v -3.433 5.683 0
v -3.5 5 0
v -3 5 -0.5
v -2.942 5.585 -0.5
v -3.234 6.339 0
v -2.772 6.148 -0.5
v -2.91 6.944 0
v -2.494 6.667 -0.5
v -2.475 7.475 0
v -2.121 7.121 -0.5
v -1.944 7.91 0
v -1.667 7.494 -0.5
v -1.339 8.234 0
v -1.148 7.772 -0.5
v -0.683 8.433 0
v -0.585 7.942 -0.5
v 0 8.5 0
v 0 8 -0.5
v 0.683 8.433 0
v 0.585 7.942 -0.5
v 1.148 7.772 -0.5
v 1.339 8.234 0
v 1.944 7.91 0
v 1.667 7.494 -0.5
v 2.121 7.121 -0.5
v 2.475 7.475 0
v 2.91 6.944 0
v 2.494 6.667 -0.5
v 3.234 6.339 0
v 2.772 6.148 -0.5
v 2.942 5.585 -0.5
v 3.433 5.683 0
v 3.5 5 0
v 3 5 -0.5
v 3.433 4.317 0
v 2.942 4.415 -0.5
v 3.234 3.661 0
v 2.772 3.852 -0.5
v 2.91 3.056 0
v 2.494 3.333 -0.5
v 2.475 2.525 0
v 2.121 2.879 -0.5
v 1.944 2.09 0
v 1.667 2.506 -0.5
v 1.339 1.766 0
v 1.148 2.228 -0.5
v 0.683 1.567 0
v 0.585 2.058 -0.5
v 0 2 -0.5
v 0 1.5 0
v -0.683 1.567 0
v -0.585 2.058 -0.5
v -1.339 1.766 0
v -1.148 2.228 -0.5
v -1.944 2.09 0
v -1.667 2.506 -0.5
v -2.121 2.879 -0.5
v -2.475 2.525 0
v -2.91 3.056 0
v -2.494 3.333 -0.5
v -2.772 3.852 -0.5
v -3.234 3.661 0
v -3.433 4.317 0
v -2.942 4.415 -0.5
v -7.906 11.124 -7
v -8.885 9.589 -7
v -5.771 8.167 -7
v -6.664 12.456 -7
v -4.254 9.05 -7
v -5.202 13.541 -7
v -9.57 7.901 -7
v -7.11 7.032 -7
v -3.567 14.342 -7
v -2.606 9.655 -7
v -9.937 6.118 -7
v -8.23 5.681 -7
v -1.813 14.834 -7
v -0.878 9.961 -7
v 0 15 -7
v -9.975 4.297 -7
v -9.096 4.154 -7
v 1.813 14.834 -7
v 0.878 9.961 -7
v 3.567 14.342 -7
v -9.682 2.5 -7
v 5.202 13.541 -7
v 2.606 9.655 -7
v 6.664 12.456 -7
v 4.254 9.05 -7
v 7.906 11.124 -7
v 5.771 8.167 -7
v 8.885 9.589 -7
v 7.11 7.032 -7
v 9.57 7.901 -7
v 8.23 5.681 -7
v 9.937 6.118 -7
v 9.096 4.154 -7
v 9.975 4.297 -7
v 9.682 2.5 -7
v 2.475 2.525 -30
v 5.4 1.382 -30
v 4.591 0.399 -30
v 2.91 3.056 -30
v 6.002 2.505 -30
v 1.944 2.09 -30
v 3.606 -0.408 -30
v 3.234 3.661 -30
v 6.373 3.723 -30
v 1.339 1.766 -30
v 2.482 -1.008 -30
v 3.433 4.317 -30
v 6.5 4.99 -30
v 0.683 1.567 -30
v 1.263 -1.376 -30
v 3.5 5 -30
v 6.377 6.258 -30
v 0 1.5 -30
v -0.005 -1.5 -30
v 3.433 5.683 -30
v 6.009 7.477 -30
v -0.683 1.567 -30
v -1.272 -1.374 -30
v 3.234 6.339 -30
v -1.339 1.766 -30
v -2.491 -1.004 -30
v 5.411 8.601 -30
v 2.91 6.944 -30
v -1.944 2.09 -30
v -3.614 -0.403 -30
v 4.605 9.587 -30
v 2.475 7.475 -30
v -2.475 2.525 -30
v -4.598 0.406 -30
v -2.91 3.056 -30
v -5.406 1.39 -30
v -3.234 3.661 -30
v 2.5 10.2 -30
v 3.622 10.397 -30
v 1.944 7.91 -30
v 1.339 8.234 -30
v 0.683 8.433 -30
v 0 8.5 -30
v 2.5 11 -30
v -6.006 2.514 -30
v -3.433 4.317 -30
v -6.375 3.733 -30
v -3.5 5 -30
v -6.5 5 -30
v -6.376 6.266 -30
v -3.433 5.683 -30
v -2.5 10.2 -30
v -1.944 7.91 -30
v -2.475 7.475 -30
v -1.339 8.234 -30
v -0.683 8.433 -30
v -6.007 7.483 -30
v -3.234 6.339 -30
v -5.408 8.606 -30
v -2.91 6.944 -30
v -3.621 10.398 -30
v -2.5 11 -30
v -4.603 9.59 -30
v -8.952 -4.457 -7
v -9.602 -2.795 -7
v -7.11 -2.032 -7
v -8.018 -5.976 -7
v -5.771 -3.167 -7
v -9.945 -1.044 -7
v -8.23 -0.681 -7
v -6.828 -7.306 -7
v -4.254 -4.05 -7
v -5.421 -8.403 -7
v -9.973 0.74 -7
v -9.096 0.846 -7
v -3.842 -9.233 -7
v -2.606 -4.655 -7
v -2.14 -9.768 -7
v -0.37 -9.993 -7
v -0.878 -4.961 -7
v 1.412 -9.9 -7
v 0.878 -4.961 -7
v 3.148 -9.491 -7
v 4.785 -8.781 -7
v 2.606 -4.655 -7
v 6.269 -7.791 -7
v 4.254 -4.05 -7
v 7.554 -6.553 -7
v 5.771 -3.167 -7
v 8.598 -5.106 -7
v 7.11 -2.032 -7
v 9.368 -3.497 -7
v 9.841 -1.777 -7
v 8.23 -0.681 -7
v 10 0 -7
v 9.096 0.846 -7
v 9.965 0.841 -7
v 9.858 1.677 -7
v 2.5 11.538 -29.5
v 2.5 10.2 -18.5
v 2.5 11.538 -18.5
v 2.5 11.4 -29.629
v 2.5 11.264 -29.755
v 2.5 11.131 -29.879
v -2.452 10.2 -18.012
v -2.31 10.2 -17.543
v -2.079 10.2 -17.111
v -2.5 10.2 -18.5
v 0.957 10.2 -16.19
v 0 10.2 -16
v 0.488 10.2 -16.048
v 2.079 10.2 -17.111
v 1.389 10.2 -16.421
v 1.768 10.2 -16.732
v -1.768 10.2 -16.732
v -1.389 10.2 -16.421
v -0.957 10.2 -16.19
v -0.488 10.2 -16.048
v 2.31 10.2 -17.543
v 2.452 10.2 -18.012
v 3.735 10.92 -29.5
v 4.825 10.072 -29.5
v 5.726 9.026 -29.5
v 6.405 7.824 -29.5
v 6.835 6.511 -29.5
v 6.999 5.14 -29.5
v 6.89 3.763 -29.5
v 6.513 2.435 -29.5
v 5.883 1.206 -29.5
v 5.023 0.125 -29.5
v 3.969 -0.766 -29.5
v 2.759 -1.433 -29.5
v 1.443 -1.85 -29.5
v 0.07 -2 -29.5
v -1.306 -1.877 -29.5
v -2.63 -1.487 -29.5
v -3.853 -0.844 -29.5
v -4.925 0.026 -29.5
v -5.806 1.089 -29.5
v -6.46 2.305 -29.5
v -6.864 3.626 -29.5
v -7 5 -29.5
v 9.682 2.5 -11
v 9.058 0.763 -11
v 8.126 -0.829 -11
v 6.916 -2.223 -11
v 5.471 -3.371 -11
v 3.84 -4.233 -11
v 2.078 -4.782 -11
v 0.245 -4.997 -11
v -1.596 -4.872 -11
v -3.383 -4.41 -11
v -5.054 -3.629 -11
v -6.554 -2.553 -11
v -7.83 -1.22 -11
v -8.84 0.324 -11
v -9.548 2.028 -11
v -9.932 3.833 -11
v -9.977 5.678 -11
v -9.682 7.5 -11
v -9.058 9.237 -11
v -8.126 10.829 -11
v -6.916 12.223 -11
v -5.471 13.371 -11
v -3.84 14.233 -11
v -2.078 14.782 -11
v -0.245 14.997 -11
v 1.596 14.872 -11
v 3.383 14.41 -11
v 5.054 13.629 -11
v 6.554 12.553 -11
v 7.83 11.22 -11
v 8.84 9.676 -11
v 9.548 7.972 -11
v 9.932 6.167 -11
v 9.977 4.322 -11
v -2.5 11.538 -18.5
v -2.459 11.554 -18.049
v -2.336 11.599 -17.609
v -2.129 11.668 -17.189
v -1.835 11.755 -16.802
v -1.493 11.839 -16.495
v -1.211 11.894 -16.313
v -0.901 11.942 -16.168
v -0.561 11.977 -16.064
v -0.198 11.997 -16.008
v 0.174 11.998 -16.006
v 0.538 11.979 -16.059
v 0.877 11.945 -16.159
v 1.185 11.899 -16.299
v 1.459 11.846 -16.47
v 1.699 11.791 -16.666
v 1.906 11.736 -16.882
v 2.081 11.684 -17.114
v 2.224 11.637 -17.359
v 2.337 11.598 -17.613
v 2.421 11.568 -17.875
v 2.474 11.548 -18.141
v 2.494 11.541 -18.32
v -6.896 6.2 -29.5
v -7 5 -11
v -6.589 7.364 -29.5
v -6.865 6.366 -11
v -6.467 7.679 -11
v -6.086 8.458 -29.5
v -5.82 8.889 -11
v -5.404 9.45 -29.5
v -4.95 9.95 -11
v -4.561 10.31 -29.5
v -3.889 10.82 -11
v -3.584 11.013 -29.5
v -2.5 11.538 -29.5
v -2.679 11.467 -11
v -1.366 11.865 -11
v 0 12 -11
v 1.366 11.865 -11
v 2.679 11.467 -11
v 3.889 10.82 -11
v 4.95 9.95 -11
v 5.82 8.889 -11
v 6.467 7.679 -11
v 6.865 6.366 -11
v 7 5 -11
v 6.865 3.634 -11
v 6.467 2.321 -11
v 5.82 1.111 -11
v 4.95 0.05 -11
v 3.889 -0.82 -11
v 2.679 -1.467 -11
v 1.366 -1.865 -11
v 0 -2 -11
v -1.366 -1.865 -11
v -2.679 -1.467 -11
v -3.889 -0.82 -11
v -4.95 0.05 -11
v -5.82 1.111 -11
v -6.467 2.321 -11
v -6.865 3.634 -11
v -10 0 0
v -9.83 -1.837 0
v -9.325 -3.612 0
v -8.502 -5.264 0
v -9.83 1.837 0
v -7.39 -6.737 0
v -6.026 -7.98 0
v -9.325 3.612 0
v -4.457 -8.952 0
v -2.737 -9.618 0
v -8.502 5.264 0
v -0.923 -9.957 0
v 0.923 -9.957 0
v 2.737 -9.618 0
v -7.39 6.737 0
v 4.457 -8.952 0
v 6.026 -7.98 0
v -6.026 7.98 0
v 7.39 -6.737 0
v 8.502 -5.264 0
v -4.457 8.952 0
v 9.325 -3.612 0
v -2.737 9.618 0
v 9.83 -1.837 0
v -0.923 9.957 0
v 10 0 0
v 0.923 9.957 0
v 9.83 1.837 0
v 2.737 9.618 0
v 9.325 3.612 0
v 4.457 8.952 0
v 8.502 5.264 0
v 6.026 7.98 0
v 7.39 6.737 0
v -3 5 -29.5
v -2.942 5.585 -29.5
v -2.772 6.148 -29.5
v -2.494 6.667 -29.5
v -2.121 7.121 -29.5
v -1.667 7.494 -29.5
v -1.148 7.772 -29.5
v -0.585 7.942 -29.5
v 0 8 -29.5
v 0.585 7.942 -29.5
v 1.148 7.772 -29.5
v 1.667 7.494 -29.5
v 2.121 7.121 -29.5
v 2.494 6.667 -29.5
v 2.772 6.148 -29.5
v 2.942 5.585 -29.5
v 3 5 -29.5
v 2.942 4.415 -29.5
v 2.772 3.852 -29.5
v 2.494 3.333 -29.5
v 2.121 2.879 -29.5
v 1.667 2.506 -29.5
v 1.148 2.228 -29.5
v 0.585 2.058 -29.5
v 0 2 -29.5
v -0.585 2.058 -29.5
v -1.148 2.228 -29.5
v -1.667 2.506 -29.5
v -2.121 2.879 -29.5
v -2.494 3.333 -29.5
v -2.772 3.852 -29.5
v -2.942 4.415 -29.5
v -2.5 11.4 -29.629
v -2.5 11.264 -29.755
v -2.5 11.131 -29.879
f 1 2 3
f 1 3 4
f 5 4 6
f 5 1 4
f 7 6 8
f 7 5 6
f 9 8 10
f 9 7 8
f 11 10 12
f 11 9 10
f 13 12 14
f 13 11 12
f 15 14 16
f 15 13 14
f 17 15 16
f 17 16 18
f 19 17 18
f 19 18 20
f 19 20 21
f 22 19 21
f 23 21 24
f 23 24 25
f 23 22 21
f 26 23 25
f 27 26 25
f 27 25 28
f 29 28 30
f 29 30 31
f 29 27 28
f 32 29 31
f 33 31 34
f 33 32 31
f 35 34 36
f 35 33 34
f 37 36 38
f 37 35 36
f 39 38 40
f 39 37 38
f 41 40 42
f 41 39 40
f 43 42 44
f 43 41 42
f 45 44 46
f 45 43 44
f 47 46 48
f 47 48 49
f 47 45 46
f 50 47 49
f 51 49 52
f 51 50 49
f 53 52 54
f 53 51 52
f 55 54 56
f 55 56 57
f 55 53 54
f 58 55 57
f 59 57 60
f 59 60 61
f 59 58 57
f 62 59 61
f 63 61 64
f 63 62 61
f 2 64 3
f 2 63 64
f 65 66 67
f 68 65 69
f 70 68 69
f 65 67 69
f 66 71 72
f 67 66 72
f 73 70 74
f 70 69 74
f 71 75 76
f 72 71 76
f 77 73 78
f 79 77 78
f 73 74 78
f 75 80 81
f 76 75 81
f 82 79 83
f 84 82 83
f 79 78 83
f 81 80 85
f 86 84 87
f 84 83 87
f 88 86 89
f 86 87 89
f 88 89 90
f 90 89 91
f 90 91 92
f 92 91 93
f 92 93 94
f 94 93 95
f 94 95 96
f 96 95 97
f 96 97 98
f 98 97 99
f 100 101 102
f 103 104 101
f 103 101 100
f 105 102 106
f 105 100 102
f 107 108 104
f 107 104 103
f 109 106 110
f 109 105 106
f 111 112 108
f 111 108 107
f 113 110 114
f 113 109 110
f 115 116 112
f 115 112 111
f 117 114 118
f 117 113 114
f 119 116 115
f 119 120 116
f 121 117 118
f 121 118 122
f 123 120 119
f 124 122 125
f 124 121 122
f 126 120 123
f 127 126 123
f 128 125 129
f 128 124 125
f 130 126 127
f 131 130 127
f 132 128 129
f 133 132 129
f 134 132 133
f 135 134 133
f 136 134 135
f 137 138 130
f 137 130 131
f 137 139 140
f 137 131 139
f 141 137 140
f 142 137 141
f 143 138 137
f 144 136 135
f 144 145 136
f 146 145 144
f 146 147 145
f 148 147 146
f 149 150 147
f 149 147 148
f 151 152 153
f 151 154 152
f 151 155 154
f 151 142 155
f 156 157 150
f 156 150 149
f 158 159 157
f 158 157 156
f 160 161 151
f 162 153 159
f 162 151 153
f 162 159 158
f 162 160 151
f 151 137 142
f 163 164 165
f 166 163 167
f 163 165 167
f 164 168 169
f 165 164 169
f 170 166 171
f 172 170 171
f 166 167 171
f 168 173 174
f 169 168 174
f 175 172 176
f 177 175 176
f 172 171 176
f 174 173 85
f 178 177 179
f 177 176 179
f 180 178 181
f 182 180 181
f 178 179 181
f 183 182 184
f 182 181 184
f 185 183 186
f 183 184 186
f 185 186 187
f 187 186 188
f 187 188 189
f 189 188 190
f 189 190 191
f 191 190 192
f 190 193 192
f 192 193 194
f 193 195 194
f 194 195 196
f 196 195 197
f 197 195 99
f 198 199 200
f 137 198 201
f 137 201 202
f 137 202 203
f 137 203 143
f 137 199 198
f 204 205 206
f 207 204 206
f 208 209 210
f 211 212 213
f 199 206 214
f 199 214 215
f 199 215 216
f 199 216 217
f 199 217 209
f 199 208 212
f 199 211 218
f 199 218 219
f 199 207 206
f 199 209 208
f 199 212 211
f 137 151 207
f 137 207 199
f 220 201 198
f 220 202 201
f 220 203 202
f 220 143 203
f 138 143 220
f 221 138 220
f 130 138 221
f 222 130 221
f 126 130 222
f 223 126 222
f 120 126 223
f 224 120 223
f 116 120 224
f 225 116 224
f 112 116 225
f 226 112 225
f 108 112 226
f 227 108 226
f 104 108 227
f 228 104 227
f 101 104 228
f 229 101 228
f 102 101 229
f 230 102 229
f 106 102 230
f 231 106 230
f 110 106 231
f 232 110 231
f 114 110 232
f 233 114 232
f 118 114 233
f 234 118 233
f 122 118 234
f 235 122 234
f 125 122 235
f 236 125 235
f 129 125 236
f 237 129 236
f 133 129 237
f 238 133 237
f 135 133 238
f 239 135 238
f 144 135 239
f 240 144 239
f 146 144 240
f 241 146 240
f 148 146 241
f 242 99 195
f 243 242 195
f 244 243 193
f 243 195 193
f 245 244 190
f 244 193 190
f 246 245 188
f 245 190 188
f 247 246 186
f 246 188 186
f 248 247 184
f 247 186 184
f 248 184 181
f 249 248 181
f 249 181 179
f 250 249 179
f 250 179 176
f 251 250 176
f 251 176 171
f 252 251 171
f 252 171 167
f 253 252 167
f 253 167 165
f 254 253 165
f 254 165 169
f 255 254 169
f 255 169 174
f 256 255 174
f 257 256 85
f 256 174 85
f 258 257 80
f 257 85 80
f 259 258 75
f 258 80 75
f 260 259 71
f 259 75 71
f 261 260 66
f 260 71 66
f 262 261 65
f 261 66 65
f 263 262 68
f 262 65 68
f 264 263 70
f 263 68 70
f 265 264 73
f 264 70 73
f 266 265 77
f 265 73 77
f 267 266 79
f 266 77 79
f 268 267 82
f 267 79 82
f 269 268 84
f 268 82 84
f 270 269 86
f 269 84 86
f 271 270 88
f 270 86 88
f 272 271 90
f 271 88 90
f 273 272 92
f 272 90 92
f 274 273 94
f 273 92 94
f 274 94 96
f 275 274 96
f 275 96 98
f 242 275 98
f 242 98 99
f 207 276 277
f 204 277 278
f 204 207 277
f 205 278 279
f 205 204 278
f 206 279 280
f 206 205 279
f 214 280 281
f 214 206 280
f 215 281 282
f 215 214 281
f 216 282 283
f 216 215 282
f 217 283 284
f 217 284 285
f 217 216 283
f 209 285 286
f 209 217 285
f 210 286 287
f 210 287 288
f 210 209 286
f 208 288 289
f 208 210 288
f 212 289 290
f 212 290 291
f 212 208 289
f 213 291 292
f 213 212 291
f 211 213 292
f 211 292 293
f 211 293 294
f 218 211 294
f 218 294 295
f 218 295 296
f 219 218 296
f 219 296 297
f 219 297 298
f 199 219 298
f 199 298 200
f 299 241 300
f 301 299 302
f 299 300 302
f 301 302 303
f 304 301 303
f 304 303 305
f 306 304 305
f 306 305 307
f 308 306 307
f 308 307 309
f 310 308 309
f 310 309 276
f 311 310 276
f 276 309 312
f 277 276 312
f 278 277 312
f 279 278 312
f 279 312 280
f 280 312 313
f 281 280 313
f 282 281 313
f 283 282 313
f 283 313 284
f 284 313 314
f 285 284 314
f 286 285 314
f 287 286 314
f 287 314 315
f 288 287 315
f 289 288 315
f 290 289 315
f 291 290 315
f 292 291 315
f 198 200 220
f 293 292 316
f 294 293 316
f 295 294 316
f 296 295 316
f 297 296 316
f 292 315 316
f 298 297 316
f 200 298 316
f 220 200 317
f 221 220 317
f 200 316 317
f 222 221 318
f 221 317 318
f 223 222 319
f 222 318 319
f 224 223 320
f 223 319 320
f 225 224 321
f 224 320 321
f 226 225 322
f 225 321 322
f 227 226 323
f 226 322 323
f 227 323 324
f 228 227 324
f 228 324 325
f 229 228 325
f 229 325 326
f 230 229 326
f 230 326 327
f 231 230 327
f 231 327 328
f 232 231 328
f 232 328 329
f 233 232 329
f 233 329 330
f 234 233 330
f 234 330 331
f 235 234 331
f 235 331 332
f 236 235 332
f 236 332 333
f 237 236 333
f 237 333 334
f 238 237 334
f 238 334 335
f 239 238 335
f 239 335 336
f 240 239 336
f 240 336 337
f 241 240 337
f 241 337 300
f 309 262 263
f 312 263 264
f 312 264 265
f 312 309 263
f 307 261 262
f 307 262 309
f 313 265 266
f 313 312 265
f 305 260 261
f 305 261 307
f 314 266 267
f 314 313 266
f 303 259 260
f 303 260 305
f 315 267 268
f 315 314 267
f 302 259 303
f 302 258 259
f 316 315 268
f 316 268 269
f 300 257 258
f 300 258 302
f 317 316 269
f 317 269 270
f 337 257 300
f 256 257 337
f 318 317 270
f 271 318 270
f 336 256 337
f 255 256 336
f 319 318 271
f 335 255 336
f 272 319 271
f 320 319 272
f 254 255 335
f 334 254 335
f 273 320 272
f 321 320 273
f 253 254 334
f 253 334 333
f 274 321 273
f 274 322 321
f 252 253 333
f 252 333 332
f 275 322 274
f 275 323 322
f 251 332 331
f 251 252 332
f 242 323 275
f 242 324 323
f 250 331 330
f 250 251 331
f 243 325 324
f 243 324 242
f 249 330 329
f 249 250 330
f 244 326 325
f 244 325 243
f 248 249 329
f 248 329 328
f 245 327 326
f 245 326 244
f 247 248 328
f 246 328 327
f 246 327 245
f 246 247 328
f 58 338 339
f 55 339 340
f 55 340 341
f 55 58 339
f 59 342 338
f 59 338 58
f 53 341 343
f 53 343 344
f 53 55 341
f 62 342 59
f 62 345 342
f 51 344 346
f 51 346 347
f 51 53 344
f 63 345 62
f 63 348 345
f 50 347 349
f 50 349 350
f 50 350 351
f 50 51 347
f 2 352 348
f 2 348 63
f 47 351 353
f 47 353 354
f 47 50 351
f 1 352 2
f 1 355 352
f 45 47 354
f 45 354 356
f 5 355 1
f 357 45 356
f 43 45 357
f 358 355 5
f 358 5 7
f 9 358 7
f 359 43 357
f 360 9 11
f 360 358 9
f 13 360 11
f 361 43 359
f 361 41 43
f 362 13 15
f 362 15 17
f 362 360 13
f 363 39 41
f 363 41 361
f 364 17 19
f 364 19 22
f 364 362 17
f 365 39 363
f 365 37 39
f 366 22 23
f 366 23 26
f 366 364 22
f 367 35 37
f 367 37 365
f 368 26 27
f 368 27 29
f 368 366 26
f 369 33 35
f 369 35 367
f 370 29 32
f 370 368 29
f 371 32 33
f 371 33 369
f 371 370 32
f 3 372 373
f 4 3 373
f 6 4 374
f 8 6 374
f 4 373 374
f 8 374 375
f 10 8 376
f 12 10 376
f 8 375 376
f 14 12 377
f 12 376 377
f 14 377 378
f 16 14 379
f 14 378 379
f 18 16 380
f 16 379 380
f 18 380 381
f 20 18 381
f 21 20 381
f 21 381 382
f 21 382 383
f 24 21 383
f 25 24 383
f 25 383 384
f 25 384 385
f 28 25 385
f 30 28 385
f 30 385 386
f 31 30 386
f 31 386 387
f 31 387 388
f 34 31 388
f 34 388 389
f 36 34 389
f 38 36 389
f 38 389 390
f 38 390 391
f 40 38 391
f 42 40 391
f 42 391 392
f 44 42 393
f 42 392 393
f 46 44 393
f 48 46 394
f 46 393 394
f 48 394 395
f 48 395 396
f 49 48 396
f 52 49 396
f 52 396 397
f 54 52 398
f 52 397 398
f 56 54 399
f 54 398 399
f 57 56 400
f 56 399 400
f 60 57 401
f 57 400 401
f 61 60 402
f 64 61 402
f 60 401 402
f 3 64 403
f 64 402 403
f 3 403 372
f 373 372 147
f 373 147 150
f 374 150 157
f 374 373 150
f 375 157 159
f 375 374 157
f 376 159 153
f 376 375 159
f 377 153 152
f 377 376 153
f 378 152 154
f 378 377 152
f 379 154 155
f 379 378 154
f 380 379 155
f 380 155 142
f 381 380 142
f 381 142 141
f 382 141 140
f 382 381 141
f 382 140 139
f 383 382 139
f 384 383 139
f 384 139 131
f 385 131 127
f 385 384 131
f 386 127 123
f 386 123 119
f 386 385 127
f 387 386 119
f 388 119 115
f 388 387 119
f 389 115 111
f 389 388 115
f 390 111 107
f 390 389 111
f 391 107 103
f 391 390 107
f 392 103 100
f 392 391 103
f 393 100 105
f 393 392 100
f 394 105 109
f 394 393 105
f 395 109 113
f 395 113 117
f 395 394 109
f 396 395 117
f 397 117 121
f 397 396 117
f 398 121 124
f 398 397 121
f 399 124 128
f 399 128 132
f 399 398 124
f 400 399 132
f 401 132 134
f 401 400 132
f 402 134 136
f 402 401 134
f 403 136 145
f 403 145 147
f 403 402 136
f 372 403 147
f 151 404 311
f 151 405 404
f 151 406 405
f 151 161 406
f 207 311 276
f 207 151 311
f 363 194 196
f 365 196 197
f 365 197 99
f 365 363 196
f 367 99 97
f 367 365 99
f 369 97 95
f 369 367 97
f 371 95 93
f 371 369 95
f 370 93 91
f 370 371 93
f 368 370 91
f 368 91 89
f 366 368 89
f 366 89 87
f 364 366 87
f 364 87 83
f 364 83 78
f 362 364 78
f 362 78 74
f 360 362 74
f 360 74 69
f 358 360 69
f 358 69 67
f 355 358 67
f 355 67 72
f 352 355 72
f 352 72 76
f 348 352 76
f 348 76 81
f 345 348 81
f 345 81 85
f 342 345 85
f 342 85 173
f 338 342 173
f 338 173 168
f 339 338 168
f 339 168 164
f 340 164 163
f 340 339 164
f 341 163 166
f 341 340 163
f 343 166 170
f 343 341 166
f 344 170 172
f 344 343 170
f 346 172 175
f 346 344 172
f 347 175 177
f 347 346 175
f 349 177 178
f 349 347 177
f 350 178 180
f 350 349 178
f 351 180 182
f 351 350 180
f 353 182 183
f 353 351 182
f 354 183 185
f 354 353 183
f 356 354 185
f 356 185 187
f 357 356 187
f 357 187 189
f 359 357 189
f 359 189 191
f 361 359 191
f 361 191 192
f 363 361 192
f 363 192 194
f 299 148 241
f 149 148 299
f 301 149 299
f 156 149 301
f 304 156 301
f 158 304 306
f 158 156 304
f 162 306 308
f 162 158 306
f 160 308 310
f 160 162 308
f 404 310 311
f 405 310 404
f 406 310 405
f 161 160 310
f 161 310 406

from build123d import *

# Parameters (mm, degrees)
SKETCH1_R           = 10
BOSS_EXTRUDE1_DEPTH = 7
SKETCH2_R           = 10
BOSS_EXTRUDE2_DEPTH = 4
SKETCH3_R           = 7
BOSS_EXTRUDE3_DEPTH = 19
CUT_EXTRUDE5_START  = 10.2
CUT_EXTRUDE5_DEPTH  = 10.2
CHAMFER2_SIZE       = 0.5
SKETCH11_R          = 3
CUT_EXTRUDE6_DEPTH  = 36
CHAMFER3_SIZE       = 0.5


with BuildPart() as part:
    # Sketch1 → Boss-Extrude1 (new body)
    with BuildSketch(Plane.XY):
        Circle(SKETCH1_R)
    extrude(amount=-BOSS_EXTRUDE1_DEPTH)

    # Sketch2 → Boss-Extrude2 (add)
    with BuildSketch(Plane(origin=(0, 0, -7), x_dir=(-1, 0, 0), z_dir=(0, 0, -1))):
        with Locations(Location((0, 5, 0), (0, 0, 194.477512186))):
            Circle(SKETCH2_R)
    extrude(amount=BOSS_EXTRUDE2_DEPTH)

    # Sketch3 → Boss-Extrude3 (add)
    with BuildSketch(Plane(origin=(0, 0, -11), x_dir=(-1, 0, 0), z_dir=(0, 0, -1))):
        with Locations((0, 5)):
            Circle(SKETCH3_R)
    extrude(amount=BOSS_EXTRUDE3_DEPTH)

    # Sketch9 → Cut-Extrude5 (cut)
    with BuildSketch(Plane(origin=(0, 0, 0), x_dir=(1, 0, 0), z_dir=(0, 1, 0)).offset(CUT_EXTRUDE5_START)):
        with BuildLine():
            Line((2.5, 18.5), (2.5, 30))
            Line((2.5, 30), (-2.5, 30))
            Line((-2.5, 30), (-2.5, 18.5))
            ThreePointArc((-2.5, 18.5), (0, 16), (2.5, 18.5))
        make_face()
    extrude(amount=CUT_EXTRUDE5_DEPTH, mode=Mode.SUBTRACT)

    # Chamfer2
    chamfer2_edges = [part.edges().sort_by_distance(p)[0] for p in [
        (3.968626967, -0.766281297, -30),
    ]]
    chamfer(chamfer2_edges, length=CHAMFER2_SIZE)

    # Sketch11 → Cut-Extrude6 (cut, through all)
    with BuildSketch(Plane(origin=(0, 0, -30), x_dir=(-1, 0, 0), z_dir=(0, 0, -1))):
        with Locations((0, 5)):
            Circle(SKETCH11_R)
    extrude(amount=-CUT_EXTRUDE6_DEPTH, mode=Mode.SUBTRACT)

    # Chamfer3
    chamfer3_edges = [part.edges().sort_by_distance(p)[0] for p in [
        (3, 5, 0),
        (3, 5, -30),
    ]]
    chamfer(chamfer3_edges, length=CHAMFER3_SIZE)


solid = part.part
